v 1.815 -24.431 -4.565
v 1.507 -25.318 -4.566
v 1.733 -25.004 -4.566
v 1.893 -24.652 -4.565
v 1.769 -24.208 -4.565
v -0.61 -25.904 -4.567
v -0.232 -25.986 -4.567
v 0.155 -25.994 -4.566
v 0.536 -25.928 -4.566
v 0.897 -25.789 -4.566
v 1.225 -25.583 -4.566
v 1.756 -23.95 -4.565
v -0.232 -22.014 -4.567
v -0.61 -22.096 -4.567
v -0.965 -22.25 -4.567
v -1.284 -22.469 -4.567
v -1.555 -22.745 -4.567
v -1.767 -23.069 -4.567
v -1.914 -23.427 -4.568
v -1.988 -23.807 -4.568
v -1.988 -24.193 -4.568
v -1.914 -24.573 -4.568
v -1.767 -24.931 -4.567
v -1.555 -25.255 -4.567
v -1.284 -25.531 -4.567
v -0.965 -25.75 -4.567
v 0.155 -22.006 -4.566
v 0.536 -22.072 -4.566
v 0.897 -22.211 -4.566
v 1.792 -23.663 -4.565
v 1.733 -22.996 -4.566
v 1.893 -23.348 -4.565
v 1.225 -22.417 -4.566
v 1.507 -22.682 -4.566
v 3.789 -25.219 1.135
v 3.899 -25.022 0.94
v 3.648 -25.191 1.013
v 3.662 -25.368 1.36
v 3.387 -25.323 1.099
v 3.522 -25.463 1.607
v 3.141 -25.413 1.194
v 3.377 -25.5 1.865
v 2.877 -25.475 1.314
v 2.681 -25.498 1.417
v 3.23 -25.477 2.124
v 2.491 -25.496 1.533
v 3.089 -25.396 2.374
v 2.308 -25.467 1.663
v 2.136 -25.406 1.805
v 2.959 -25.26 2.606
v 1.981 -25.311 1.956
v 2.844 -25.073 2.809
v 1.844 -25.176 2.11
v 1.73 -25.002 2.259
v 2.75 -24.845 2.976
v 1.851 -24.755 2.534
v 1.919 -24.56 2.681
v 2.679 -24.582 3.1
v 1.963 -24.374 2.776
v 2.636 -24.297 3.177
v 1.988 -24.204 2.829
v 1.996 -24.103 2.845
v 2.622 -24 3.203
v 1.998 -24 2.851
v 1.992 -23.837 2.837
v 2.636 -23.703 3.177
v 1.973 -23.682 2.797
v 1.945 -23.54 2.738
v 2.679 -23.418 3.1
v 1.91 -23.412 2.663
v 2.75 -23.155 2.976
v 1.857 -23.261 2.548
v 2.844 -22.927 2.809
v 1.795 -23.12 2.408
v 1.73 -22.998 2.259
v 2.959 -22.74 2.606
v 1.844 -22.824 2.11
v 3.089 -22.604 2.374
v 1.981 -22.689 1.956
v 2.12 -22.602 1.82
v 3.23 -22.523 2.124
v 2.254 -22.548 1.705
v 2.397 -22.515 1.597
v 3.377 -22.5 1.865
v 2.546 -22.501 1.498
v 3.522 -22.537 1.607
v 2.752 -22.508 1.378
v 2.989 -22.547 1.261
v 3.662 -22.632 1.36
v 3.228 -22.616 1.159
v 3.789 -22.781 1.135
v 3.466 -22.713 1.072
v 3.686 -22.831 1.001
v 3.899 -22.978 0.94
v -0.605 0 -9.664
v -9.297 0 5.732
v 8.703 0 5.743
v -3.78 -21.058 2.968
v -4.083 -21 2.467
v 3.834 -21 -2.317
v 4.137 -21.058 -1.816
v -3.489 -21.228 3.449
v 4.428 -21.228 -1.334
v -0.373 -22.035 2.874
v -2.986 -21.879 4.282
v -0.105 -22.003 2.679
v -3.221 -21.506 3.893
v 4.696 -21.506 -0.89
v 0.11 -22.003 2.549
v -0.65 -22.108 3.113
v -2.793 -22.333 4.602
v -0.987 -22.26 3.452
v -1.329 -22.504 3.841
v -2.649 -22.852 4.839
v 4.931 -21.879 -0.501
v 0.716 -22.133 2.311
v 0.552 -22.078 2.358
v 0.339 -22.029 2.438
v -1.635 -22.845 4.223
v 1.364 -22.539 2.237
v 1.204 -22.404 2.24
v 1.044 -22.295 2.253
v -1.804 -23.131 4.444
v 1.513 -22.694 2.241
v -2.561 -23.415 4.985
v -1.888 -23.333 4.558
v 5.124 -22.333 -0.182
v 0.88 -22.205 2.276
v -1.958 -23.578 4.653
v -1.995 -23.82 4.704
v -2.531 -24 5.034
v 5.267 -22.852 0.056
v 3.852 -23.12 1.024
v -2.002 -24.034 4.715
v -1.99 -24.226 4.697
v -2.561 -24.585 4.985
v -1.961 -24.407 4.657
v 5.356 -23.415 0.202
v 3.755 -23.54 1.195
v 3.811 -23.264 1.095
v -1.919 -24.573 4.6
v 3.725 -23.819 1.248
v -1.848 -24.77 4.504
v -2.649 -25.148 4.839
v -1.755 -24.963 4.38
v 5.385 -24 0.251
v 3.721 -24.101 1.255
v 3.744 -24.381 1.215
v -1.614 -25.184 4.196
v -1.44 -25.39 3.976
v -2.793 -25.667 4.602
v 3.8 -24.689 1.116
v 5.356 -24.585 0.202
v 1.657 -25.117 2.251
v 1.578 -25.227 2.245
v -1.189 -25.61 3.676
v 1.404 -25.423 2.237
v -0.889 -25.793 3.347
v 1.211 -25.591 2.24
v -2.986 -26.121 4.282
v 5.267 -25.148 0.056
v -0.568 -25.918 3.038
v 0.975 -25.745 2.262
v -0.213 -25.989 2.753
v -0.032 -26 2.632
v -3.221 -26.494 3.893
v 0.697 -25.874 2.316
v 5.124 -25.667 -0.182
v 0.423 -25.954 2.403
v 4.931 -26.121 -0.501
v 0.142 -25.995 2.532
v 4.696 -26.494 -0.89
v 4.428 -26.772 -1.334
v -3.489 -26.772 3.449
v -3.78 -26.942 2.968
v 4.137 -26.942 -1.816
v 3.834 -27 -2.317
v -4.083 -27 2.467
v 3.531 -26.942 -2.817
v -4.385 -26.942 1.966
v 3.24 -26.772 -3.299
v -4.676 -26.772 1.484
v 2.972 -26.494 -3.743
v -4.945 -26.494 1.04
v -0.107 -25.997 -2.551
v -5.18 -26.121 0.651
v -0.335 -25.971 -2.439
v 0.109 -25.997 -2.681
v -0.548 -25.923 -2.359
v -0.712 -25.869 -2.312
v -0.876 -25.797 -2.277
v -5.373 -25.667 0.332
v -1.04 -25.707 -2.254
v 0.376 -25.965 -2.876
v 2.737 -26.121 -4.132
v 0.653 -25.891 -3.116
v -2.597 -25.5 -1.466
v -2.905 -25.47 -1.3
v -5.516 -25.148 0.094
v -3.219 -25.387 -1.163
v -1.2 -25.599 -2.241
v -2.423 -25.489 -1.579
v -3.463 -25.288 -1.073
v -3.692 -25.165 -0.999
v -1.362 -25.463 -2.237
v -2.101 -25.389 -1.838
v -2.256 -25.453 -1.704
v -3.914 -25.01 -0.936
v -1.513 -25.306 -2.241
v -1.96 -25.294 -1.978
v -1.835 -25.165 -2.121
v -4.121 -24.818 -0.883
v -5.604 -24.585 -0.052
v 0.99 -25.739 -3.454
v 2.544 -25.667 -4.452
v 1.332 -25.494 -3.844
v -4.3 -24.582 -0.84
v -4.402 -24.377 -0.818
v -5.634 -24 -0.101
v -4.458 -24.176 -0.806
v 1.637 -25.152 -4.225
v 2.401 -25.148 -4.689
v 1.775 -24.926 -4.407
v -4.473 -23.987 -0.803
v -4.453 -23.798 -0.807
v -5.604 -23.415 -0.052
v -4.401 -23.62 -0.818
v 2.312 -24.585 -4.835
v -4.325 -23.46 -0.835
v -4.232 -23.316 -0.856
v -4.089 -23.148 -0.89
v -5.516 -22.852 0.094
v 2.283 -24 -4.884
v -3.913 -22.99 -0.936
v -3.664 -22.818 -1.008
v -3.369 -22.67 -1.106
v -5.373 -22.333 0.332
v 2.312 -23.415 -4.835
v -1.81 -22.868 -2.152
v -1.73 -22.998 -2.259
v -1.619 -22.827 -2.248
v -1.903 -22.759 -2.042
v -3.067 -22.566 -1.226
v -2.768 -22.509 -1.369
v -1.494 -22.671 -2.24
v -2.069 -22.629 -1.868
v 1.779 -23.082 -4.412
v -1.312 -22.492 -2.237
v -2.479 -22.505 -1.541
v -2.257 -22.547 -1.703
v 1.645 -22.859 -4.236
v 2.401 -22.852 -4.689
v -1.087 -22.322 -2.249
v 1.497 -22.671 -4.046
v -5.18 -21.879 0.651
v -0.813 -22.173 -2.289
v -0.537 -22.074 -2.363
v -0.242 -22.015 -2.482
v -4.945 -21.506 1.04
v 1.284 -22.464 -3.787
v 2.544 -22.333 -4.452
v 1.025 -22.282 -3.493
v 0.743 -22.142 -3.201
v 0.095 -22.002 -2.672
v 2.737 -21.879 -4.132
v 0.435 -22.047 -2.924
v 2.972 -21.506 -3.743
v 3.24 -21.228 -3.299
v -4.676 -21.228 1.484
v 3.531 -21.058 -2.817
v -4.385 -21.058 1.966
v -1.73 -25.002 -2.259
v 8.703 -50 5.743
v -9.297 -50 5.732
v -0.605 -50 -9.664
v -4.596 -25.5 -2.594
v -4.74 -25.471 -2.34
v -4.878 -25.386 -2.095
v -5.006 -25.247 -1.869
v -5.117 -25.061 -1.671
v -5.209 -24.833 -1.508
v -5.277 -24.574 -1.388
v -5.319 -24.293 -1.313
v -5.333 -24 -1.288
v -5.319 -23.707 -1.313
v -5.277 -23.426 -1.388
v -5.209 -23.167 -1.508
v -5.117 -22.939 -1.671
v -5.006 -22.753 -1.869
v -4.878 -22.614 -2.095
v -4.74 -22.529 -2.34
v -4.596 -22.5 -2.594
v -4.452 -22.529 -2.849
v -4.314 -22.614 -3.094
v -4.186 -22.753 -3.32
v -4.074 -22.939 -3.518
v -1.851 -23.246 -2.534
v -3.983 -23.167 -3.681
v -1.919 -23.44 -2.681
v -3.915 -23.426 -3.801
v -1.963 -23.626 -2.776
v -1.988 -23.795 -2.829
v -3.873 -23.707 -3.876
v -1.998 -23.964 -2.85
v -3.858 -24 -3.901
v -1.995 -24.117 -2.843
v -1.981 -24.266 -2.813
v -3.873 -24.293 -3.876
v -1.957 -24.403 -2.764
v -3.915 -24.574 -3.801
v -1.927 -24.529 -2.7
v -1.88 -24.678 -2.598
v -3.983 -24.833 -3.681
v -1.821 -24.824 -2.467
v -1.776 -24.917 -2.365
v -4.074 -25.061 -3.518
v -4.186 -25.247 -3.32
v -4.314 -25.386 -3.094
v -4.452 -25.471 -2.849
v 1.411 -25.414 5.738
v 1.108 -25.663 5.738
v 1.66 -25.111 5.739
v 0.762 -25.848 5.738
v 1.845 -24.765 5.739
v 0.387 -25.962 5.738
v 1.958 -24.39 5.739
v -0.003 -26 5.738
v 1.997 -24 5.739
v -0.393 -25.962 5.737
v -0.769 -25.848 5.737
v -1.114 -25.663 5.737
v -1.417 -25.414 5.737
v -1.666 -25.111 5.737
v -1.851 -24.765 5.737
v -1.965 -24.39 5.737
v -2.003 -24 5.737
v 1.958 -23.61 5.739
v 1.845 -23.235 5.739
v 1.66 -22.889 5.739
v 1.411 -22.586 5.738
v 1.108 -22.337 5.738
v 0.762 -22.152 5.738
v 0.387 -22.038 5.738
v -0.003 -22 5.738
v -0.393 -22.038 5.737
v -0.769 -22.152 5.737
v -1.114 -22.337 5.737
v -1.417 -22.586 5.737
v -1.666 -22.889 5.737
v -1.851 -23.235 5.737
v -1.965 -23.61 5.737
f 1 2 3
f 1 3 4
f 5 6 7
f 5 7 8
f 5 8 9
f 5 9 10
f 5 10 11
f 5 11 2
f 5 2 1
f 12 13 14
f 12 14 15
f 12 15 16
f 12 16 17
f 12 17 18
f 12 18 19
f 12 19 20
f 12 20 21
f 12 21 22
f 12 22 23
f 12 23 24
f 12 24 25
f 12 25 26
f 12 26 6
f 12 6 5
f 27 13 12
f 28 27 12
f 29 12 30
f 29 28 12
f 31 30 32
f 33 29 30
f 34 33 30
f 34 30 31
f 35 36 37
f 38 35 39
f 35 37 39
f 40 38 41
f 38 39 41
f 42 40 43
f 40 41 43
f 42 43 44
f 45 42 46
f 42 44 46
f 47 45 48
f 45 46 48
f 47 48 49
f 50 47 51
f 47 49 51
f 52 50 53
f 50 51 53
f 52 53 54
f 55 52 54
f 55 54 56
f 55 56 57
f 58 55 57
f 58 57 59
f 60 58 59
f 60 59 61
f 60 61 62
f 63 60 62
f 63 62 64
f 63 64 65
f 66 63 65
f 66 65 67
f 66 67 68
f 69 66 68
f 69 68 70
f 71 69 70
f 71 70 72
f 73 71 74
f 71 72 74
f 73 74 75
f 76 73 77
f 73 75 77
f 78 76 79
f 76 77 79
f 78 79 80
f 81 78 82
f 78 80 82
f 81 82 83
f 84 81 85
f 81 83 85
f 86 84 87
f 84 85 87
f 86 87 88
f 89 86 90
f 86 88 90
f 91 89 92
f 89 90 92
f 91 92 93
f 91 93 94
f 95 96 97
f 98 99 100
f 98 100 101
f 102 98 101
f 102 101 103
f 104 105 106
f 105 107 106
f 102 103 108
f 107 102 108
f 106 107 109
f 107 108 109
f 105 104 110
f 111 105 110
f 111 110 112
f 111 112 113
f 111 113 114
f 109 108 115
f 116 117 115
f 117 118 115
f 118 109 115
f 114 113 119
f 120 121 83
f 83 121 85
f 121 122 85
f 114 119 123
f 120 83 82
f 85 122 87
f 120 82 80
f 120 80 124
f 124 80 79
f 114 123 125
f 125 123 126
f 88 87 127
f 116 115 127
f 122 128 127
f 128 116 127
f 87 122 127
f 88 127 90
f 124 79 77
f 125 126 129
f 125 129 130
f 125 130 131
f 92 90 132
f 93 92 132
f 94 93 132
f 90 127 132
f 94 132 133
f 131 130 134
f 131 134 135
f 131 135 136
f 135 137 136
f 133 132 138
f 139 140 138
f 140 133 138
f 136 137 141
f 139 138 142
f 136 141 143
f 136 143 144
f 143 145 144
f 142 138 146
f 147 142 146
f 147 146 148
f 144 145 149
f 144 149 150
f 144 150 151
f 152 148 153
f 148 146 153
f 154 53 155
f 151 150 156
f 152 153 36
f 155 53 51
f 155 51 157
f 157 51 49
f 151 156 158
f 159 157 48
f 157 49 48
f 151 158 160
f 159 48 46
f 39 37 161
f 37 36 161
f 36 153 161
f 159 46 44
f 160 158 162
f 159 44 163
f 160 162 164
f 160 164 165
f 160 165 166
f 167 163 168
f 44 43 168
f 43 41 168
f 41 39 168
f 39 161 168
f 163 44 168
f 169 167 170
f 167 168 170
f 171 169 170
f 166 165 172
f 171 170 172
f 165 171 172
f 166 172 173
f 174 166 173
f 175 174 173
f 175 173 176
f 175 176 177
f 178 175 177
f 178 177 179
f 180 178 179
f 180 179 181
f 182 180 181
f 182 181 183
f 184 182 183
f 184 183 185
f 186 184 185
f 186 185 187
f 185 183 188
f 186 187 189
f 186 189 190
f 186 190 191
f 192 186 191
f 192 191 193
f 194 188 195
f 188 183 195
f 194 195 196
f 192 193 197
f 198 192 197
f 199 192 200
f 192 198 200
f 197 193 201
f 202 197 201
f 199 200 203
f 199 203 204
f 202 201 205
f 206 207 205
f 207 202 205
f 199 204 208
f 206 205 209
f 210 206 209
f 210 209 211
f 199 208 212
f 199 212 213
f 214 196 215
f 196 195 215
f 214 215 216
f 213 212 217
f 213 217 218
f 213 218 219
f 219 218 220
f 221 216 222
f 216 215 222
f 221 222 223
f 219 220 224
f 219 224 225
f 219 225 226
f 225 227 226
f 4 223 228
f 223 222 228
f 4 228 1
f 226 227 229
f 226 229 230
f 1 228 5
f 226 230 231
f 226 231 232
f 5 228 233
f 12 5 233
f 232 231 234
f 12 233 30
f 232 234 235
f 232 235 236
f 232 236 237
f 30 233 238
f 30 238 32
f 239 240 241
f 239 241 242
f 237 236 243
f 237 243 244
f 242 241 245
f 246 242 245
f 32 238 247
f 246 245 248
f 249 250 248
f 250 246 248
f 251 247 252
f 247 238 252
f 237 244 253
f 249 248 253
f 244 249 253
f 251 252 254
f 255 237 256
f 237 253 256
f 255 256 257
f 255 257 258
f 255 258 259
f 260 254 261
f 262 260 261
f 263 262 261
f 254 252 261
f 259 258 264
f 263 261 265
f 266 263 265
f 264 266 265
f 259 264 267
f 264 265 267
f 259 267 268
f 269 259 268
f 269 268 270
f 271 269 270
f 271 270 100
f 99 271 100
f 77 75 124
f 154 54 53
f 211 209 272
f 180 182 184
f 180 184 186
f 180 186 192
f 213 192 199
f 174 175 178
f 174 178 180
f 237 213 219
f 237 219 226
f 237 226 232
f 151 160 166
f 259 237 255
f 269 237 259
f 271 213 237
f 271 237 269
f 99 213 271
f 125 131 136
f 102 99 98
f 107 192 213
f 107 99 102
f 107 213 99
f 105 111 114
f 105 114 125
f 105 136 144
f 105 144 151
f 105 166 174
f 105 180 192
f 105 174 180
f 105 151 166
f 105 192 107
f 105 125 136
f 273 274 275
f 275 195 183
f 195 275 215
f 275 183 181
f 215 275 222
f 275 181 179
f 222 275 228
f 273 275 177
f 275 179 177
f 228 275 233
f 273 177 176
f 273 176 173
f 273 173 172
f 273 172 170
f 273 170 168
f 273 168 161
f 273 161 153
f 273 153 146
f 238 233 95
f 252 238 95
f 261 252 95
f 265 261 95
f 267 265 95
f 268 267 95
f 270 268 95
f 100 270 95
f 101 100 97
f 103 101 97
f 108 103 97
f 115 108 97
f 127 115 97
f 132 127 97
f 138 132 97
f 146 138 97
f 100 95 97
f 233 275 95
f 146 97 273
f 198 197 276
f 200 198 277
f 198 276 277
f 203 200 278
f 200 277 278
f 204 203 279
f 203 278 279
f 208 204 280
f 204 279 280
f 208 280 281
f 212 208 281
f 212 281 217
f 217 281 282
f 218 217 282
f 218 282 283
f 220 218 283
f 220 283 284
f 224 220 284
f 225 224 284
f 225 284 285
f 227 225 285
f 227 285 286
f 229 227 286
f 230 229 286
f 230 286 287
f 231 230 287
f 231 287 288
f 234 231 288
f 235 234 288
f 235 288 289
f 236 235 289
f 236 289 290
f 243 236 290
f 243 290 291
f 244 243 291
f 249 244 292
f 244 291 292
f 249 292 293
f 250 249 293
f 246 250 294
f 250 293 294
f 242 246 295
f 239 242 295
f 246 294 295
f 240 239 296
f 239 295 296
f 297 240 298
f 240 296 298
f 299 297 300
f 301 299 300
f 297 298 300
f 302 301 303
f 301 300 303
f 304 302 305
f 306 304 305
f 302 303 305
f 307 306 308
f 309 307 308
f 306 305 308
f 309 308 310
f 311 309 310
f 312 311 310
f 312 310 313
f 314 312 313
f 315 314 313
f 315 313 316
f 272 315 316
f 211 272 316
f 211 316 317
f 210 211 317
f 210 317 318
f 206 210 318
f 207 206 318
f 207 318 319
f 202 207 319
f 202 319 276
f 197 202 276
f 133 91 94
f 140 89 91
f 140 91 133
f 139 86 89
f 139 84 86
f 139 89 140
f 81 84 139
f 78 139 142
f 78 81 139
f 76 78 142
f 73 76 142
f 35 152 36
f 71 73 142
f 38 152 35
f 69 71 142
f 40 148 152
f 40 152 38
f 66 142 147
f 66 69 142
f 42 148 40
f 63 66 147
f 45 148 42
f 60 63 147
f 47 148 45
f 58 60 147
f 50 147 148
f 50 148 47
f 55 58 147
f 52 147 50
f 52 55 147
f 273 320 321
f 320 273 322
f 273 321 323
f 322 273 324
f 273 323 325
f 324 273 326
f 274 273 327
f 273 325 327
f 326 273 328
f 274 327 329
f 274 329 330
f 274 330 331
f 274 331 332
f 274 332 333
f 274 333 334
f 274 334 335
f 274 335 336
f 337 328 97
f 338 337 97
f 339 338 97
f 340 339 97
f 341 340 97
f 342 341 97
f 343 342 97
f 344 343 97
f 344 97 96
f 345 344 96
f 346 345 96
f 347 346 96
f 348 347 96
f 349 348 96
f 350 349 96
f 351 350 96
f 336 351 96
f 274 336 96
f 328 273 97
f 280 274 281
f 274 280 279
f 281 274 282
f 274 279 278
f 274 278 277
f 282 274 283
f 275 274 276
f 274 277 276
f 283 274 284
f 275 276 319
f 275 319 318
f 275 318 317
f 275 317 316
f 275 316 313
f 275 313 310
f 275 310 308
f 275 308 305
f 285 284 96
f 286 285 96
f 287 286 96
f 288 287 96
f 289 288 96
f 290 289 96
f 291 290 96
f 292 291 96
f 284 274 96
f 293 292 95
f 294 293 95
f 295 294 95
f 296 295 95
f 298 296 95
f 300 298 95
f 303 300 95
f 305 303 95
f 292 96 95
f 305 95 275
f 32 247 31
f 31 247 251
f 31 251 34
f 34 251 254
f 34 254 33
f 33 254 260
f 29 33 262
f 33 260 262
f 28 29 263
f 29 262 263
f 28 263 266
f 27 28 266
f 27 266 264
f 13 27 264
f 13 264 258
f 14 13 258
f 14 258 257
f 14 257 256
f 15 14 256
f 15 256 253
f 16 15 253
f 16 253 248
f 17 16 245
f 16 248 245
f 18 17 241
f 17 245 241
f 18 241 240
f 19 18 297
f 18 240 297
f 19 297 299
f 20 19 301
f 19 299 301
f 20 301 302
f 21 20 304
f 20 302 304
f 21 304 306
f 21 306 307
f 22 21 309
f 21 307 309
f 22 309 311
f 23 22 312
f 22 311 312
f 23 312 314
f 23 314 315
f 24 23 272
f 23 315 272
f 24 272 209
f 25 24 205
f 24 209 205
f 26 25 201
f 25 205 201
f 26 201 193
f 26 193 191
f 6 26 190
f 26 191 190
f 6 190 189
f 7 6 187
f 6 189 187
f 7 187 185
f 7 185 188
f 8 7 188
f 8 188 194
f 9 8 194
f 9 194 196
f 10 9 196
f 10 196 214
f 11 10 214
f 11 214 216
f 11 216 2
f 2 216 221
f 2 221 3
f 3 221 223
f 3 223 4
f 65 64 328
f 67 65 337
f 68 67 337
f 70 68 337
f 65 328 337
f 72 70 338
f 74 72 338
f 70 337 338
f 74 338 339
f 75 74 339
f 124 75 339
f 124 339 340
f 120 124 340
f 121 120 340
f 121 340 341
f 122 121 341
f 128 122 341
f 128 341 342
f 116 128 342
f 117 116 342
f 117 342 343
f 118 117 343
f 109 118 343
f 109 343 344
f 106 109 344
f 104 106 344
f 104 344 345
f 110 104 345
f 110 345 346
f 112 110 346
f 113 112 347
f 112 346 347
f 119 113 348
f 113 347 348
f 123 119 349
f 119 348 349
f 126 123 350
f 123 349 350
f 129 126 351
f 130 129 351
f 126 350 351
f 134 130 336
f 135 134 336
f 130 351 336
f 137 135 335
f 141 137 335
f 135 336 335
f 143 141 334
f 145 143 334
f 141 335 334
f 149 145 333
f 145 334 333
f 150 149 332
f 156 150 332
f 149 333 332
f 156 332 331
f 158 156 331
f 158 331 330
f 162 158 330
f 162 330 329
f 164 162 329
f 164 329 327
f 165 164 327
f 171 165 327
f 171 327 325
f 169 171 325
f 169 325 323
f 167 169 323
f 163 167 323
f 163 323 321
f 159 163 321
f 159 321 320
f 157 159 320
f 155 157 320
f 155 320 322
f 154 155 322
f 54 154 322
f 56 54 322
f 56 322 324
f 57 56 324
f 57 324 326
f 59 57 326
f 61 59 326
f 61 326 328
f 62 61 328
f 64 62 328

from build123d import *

# Parameters (mm, degrees)
F1_DEPTH = 50
F2_R     = 3
F5_DEPTH = 9.24953
F3_R     = 2
F6_DEPTH = 10.30413
F4_R     = 1.5
F7_DEPTH = 9.13494


with BuildPart() as f1:
    # F0 (on Front) → F1 (new body)
    with BuildSketch(Plane.XZ):
        Polygon((-9.2966205801, 5.7323870165), (-0.6050675001, -9.6636938179), (8.7033765413, 5.7425669072), align=None)
    extrude(amount=F1_DEPTH)

    # F2 (on face) → F5 (cut)
    with BuildSketch(Plane(origin=(3.8340726786, 0, -2.3165420615), x_dir=(0, 1, 0), z_dir=(0.8559033736, 0, -0.5171357801))):
        with Locations((-24, 0)):
            Circle(F2_R)
    extrude(amount=-F5_DEPTH, mode=Mode.SUBTRACT)

    # F3 (on face) → F6 (cut)
    with BuildSketch(Plane(origin=(-0.0032449215, 0, 5.7376428811), x_dir=(0.9999998401, 0, 0.0005655495), z_dir=(-0.0005655495, 0, 0.9999998401))):
        with Locations((0, -24)):
            Circle(F3_R)
    extrude(amount=-F6_DEPTH, mode=Mode.SUBTRACT)

    # F4 (on face) → F7 (cut)
    with BuildSketch(Plane(origin=(-4.5958448678, 0, -2.5944933678), x_dir=(0, -1, 0), z_dir=(-0.8708190517, 0, -0.491603681))):
        with Locations((24, 0)):
            Circle(F4_R)
    extrude(amount=-F7_DEPTH, mode=Mode.SUBTRACT)


solid = f1.part
